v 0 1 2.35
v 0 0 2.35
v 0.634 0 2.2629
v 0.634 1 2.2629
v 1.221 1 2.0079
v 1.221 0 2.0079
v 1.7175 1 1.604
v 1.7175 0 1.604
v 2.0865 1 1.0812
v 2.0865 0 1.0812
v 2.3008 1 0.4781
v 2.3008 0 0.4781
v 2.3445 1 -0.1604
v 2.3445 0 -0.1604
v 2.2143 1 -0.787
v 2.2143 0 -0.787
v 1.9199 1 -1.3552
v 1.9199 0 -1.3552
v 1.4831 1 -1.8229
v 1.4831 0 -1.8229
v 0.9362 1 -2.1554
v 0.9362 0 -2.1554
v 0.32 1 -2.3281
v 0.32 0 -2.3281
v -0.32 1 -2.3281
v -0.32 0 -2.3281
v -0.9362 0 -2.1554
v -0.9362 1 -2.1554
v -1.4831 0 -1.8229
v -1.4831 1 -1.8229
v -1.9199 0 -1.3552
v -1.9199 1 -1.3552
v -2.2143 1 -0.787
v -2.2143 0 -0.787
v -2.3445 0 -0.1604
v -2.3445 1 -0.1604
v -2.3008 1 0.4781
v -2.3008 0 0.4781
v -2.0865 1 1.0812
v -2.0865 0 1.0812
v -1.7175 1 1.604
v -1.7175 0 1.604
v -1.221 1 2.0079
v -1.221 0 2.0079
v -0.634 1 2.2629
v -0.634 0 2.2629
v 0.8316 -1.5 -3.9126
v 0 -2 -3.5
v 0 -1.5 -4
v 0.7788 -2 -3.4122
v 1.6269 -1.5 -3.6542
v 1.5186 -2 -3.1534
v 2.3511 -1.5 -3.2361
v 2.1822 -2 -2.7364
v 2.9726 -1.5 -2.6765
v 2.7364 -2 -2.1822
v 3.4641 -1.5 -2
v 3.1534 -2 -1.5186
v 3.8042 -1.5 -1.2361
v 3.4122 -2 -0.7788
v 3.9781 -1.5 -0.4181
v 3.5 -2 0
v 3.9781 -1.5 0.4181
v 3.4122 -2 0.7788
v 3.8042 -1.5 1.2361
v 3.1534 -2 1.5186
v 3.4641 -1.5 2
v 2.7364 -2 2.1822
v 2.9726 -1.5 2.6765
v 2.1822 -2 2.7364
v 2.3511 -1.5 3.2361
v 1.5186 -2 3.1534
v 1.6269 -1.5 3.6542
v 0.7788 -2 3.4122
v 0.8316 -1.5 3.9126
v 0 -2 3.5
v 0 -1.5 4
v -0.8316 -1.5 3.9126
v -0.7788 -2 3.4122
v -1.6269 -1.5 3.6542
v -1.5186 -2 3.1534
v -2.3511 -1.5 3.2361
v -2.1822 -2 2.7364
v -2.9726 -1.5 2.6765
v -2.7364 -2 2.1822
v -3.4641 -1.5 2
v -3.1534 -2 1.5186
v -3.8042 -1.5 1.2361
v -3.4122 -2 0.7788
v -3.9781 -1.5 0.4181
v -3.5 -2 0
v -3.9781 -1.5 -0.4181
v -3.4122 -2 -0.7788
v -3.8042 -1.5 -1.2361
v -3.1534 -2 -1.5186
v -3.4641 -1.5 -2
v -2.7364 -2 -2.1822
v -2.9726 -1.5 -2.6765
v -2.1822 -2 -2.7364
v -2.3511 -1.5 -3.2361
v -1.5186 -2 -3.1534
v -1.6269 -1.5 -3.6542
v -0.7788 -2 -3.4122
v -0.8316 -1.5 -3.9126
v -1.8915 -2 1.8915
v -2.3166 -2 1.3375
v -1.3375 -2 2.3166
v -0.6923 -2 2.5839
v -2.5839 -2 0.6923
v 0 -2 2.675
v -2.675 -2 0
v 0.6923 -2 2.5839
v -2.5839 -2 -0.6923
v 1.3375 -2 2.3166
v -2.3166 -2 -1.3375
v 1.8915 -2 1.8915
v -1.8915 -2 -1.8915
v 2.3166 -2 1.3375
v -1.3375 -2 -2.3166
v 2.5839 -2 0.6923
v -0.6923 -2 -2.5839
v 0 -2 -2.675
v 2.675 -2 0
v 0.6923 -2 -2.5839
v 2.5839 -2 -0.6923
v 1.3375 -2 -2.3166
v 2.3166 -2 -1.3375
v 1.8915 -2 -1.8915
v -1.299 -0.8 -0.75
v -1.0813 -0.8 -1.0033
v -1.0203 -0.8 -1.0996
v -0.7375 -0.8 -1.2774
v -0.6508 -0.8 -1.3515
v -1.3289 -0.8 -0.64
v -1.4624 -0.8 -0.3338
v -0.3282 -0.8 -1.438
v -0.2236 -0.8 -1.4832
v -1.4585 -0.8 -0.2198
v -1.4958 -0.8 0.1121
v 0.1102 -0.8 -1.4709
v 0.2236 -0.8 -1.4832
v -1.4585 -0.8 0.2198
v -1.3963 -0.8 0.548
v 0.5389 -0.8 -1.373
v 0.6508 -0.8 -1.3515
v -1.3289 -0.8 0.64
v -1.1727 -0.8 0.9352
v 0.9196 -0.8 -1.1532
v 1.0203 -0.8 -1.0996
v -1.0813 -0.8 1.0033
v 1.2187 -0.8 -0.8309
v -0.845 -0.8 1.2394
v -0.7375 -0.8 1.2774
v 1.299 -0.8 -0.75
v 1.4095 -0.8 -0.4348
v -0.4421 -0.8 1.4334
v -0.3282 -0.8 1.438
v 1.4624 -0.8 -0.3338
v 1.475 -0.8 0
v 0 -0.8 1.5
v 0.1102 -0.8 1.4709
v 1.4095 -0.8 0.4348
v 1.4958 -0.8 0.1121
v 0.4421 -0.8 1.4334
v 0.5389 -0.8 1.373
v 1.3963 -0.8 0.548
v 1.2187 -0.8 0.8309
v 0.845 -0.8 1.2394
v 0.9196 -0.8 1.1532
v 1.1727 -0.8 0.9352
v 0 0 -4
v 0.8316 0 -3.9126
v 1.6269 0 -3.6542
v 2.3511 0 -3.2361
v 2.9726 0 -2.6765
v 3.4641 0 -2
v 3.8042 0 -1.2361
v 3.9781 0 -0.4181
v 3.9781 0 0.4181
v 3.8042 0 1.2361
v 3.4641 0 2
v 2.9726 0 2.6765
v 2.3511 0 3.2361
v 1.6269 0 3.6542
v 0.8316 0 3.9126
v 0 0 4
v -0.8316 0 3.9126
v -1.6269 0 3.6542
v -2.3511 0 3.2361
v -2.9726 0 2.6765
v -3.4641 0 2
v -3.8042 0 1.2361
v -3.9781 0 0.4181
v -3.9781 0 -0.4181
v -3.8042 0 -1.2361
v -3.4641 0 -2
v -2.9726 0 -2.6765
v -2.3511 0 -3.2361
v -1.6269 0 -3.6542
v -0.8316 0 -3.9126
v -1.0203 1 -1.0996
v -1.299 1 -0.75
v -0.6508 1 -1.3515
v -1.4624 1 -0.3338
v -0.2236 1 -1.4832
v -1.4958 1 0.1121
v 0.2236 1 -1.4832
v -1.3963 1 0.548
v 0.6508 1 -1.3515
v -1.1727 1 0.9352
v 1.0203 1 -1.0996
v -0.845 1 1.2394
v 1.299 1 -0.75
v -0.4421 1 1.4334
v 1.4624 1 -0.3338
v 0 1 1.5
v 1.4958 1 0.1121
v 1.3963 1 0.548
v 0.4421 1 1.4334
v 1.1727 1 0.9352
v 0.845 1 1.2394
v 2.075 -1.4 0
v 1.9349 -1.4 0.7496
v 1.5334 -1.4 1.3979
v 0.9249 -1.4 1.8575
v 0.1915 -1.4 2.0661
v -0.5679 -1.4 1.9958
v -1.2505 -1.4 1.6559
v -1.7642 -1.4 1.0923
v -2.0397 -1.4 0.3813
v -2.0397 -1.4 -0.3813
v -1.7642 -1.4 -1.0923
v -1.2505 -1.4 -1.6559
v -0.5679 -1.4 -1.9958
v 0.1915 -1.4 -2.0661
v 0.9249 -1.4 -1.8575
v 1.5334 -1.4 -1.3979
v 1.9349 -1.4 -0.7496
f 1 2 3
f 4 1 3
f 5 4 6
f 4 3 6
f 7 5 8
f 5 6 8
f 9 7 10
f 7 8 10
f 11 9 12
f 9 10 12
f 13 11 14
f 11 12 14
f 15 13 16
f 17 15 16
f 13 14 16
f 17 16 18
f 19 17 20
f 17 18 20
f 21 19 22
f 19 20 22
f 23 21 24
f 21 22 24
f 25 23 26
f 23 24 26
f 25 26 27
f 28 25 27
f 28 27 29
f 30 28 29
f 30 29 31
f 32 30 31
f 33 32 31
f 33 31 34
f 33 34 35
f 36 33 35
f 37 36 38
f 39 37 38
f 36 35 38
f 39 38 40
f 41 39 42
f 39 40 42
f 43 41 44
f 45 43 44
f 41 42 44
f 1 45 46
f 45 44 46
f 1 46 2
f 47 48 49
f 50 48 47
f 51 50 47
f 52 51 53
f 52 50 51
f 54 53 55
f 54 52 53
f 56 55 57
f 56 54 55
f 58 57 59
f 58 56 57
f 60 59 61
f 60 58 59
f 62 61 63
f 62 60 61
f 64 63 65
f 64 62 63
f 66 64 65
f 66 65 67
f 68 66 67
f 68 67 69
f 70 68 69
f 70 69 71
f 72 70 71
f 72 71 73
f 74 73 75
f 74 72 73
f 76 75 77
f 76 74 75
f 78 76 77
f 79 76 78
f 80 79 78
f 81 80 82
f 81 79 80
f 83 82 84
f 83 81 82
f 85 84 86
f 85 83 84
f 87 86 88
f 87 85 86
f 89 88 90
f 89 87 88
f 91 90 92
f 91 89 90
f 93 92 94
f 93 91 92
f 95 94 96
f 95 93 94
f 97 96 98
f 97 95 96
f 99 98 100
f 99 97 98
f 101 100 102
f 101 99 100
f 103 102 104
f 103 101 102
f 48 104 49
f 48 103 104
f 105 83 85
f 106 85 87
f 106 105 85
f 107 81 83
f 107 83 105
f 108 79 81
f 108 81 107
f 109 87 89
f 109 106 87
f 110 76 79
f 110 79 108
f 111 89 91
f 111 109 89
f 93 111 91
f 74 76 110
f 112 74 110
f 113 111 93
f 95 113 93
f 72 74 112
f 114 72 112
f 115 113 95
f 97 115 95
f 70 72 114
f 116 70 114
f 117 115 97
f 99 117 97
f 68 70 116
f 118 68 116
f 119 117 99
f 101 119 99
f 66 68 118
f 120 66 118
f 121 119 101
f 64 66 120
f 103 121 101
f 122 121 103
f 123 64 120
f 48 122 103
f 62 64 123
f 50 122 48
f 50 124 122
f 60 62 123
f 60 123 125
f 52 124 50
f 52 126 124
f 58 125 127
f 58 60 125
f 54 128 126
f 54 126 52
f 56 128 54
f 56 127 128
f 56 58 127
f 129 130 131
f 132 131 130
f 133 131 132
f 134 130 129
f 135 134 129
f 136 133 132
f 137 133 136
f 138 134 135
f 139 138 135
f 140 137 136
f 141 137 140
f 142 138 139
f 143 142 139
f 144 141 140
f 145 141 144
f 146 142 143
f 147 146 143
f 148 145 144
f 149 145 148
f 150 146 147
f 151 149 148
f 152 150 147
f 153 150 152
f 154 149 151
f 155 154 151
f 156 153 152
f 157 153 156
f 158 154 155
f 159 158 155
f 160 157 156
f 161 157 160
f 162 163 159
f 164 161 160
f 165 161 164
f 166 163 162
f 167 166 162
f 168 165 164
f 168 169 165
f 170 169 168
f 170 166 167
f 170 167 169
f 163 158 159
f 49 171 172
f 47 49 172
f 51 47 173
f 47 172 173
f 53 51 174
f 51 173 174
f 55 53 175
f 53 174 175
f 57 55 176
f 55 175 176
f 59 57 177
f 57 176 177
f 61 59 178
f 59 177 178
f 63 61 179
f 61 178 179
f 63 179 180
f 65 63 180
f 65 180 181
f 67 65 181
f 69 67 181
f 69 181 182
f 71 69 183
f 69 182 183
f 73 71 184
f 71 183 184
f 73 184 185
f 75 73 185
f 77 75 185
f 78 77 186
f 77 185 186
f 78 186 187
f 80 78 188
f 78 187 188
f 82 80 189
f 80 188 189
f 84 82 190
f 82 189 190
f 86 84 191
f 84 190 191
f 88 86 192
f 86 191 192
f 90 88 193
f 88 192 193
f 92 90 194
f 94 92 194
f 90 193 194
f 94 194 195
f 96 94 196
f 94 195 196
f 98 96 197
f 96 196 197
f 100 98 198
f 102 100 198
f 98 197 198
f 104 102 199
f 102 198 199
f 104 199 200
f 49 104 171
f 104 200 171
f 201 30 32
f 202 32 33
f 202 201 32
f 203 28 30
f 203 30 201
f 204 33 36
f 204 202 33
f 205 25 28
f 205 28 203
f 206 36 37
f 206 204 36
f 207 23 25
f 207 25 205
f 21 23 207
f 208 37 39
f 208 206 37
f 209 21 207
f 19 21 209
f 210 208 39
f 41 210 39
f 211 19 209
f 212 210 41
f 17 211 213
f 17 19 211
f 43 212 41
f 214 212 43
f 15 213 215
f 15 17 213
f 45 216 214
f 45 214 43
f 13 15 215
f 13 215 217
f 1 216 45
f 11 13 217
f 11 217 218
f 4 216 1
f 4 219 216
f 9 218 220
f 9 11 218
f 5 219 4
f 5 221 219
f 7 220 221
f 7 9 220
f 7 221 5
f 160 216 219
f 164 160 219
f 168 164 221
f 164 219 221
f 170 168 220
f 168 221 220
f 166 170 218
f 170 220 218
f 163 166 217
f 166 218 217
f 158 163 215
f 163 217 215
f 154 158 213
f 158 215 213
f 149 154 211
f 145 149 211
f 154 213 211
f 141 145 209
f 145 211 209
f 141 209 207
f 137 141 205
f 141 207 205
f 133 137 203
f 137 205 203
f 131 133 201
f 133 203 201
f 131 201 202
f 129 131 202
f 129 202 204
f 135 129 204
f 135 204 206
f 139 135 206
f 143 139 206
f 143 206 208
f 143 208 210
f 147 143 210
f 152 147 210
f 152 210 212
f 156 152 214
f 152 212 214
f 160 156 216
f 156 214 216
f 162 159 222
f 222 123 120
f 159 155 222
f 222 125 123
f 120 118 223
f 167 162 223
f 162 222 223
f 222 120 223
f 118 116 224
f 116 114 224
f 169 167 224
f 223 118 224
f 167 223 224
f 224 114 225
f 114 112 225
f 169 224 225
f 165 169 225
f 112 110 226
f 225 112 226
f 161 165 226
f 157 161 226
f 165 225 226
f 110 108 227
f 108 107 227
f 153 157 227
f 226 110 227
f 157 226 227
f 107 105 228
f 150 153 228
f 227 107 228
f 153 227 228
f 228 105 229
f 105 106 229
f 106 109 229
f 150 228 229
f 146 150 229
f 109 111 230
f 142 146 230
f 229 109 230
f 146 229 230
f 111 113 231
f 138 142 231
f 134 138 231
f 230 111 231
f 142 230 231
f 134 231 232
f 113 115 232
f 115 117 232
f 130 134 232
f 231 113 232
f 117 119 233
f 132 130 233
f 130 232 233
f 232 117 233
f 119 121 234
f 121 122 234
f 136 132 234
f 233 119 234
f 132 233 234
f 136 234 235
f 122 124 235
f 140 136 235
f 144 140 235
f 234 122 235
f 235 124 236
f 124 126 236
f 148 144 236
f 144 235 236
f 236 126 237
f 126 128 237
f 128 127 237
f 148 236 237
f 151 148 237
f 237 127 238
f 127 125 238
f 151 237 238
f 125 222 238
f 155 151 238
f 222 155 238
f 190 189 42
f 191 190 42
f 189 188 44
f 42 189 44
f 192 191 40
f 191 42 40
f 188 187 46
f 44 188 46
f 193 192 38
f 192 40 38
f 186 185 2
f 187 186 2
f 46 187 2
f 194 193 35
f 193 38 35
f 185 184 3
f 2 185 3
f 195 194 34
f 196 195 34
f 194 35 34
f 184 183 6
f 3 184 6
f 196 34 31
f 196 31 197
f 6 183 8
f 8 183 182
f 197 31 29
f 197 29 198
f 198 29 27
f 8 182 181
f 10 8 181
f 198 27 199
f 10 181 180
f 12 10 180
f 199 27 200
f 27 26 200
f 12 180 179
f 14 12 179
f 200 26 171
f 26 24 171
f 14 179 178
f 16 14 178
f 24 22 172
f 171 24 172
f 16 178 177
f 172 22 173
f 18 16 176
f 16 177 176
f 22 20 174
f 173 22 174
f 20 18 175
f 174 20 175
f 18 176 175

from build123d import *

# Parameters (mm, degrees)
SKETCH2_R           = 2.35
BOSS_EXTRUDE1_DEPTH = 1
SKETCH3_R           = 4
BOSS_EXTRUDE2_DEPTH = 2
SKETCH4_R           = 2.675
CUT_EXTRUDE1_DEPTH  = 1.8
CUT_EXTRUDE1_DRAFT  = -45
SKETCH5_R           = 1.5
CUT_EXTRUDE2_DEPTH  = 1.8
CHAMFER1_SIZE       = 0.5


with BuildPart() as part:
    # Sketch2 → Boss-Extrude1 (new body)
    with BuildSketch(Plane(origin=(0, 0, 0), x_dir=(1, 0, 0), z_dir=(0, 1, 0))):
        with Locations(Location((0, 0, 0), (0, 0, 270))):
            Circle(SKETCH2_R)
    extrude(amount=BOSS_EXTRUDE1_DEPTH)

    # Sketch3 → Boss-Extrude2 (add)
    with BuildSketch(Plane.XZ):
        with Locations(Location((0, 0, 0), (0, 0, 270))):
            Circle(SKETCH3_R)
    extrude(amount=BOSS_EXTRUDE2_DEPTH)


with BuildPart() as cut_extrude1_tool:
    # Sketch4 → Cut-Extrude1 (with draft: the straight prism first)
    with BuildSketch(Plane.XZ.offset(2)):
        Circle(SKETCH4_R)
    extrude(amount=-CUT_EXTRUDE1_DEPTH)
    # Cut-Extrude1: the draft: its side faces are tilted about the plane it starts from
    cut_extrude1_sides = [cut_extrude1_tool.faces().sort_by_distance(p)[0] for p in [
        (-2.675, -1.1, 0),
    ]]
    draft(cut_extrude1_sides, Plane.XZ.offset(2), CUT_EXTRUDE1_DRAFT)


with BuildPart() as part_1:
    add(part.part)

    # Cut-Extrude1: cut by cut_extrude1_tool
    add(cut_extrude1_tool.part, mode=Mode.SUBTRACT)

    # Sketch5 → Cut-Extrude2 (cut)
    with BuildSketch(Plane(origin=(0, 1, 0), x_dir=(1, 0, 0), z_dir=(0, 1, 0))):
        with Locations(Location((0, 0, 0), (0, 0, 270))):
            Circle(SKETCH5_R)
    extrude(amount=-CUT_EXTRUDE2_DEPTH, mode=Mode.SUBTRACT)

    # Chamfer1
    chamfer1_edges = [part_1.edges().sort_by_distance(p)[0] for p in [
        (0, -2, 4),
    ]]
    chamfer(chamfer1_edges, length=CHAMFER1_SIZE)


solid = part_1.part
